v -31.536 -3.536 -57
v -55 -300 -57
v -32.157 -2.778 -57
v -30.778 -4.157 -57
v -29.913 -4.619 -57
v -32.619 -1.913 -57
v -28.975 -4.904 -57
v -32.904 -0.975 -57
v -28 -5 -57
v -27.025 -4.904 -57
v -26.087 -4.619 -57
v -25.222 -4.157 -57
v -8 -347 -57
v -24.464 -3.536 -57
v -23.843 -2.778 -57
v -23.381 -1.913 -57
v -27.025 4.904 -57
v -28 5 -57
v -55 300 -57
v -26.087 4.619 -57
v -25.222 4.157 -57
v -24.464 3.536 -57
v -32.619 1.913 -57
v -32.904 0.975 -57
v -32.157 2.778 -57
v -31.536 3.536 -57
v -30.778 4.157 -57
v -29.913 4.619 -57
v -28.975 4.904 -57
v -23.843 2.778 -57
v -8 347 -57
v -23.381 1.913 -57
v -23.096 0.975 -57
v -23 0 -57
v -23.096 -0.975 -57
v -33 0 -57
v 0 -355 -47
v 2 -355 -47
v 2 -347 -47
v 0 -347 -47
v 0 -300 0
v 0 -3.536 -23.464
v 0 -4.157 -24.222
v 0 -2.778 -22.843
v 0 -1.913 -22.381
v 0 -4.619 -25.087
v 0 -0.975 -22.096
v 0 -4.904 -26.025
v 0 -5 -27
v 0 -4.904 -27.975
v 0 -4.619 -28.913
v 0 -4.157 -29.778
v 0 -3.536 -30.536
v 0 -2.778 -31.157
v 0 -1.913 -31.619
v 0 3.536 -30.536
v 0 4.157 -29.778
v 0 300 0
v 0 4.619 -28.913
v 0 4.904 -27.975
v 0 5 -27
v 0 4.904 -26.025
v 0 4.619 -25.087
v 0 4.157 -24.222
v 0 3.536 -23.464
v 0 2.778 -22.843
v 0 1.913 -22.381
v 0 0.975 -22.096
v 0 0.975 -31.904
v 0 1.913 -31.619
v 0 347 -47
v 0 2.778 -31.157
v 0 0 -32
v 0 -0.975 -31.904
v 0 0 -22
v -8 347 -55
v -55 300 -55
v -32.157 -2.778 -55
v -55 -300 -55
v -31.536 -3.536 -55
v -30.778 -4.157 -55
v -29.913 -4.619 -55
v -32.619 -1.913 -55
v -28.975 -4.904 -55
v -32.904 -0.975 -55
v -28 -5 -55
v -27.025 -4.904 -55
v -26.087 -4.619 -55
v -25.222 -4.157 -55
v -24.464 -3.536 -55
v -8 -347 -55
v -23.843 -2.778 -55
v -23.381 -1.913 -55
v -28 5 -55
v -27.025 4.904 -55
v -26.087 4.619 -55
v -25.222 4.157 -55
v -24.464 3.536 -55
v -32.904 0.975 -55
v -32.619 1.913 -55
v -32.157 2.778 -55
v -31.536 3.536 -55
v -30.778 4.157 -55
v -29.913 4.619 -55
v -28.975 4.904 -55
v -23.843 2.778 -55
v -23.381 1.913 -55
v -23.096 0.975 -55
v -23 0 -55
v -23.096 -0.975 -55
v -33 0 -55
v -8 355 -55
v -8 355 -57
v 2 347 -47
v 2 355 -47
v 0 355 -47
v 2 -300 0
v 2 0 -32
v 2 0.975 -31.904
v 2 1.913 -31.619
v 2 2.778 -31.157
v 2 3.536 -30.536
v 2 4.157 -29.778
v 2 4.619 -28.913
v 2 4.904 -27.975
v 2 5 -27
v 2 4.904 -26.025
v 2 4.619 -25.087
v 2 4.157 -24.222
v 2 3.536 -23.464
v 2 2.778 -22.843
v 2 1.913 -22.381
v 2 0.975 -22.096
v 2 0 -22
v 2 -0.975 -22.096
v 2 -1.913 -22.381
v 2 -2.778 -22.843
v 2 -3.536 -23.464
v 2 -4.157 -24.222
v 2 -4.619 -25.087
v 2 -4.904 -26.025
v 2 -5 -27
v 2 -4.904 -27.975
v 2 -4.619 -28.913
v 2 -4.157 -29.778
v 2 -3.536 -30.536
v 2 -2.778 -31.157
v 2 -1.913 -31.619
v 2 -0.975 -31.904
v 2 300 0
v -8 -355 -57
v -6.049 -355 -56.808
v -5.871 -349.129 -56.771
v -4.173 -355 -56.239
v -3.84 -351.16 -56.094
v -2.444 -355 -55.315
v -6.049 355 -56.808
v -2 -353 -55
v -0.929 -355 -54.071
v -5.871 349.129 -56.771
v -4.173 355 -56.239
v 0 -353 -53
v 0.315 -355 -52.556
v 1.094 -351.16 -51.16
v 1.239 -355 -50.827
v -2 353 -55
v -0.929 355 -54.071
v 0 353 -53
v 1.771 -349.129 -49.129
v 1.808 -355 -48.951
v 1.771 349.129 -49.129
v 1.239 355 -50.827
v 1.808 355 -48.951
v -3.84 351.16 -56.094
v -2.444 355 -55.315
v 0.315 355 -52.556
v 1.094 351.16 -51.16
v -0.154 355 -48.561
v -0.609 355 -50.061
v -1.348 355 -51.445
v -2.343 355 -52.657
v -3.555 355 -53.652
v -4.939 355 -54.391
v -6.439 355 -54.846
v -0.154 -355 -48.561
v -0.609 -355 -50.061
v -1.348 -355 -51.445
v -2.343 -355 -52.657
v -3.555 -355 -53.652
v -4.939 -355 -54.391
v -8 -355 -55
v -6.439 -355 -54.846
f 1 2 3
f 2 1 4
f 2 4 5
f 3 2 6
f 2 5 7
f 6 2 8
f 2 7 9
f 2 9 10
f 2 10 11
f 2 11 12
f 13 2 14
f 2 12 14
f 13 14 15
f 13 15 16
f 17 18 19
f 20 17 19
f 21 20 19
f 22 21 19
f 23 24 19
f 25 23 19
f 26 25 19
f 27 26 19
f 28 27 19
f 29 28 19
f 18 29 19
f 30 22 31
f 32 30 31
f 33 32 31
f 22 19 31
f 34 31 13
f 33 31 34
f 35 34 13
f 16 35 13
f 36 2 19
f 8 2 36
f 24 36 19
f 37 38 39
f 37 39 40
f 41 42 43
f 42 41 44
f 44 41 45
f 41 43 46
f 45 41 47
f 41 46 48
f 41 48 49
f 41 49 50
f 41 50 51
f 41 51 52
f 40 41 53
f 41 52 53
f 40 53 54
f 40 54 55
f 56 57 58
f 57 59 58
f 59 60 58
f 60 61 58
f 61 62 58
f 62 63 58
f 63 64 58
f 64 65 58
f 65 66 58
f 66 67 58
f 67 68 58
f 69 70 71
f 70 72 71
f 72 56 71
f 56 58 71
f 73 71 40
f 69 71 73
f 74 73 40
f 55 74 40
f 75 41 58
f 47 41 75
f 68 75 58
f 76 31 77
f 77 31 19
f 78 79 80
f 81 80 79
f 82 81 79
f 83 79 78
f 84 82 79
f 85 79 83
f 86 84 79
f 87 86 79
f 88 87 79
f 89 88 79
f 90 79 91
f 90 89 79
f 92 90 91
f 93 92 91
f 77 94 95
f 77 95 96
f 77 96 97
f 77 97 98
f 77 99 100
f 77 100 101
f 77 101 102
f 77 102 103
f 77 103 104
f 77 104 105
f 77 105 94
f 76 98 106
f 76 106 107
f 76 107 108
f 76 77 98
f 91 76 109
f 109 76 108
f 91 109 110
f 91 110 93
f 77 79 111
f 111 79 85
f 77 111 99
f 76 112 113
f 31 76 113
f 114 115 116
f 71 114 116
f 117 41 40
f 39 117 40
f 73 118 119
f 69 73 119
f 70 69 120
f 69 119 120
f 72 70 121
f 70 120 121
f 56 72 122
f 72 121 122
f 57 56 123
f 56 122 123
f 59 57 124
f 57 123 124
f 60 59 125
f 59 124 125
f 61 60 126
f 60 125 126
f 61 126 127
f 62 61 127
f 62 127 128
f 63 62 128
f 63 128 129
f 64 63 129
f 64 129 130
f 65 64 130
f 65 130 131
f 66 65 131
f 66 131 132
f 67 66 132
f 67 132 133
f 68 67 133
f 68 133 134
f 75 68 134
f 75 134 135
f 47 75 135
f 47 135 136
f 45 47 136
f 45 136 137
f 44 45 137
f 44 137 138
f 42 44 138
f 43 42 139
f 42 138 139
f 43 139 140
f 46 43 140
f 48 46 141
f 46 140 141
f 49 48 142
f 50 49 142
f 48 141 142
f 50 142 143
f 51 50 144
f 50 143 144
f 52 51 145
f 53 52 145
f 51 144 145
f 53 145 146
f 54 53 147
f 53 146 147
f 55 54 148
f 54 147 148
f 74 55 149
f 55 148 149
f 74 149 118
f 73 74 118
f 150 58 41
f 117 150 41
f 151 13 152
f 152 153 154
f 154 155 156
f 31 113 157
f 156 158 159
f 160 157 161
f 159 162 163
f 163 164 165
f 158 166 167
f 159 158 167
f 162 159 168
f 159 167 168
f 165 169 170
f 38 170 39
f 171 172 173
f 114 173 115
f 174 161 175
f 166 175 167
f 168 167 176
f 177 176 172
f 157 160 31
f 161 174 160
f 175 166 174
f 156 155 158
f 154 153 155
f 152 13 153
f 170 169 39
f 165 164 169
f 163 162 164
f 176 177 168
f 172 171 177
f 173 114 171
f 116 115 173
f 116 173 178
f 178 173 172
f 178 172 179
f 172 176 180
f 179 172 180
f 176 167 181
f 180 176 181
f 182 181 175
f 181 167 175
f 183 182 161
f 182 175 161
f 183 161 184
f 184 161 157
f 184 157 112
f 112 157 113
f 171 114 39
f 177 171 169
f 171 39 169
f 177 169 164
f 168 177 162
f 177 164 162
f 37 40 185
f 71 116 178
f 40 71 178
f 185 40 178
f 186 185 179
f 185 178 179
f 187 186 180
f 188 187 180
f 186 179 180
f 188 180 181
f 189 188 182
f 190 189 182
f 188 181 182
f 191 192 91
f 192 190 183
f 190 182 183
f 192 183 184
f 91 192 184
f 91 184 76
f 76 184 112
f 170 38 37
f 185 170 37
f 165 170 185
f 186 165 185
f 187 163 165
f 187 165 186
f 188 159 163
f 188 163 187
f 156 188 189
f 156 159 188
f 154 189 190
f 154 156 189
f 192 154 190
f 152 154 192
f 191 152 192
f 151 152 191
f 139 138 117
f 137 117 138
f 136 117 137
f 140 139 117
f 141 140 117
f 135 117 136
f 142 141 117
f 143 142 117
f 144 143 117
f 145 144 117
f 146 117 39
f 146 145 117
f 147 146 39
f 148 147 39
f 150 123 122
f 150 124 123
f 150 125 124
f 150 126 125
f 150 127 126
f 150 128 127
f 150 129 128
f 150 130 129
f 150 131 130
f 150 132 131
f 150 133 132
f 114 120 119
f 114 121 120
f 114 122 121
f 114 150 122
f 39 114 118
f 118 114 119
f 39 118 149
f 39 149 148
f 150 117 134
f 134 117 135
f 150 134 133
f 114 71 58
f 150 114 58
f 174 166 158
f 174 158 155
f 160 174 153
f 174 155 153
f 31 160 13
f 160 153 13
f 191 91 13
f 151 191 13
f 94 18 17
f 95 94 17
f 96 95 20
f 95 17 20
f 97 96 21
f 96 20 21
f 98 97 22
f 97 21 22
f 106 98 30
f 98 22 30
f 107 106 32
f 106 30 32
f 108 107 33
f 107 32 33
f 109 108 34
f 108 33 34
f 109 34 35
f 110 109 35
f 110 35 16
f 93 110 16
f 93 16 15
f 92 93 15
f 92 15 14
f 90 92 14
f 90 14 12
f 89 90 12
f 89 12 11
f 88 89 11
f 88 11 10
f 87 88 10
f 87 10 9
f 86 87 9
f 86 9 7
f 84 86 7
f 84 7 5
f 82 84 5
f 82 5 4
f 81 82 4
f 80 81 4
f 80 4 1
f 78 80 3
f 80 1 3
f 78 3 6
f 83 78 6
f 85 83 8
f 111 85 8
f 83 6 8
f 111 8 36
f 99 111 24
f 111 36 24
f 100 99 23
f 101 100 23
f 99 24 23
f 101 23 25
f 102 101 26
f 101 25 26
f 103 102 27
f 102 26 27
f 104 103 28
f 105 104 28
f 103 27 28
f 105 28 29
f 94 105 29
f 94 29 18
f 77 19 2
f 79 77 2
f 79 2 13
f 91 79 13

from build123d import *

# Parameters (mm, degrees)
BOSS_EXTRUDE1_DEPTH            = 2
BOSS_EXTRUDE3_DEPTH            = 2
CUT_EXTRUDE2_REACH             = 365.729
CUT_EXTRUDE2_DIRECTION_2_REACH = 365.729
BOSS_EXTRUDE5_DEPTH            = 355
BOSS_EXTRUDE5_DEPTH_BACK       = 355
SKETCH7_R                      = 5
CUT_EXTRUDE3_DEPTH             = 355
SKETCH8_R                      = 5
CUT_EXTRUDE4_DEPTH             = 355


with BuildPart() as part:
    # Sketch1 → Boss-Extrude1 (new body)
    with BuildSketch(Plane(origin=(0, 0, 0), x_dir=(0, 0, -1), z_dir=(1, 0, 0))):
        Polygon((0, -300), (55, -355), (57, -355), (57, 355), (55, 355), (0, 300), align=None)
    extrude(amount=BOSS_EXTRUDE1_DEPTH)

    # Sketch2 → Boss-Extrude3 (add)
    with BuildSketch(Plane(origin=(0, 0, -57), x_dir=(-1, 0, 0), z_dir=(0, 0, -1))):
        Polygon((55, 300), (55, -300), (0, -355), (0, 355), align=None)
    extrude(amount=-BOSS_EXTRUDE3_DEPTH)

    # Sketch3 → Cut-Extrude2 (cut, up to next)
    with BuildSketch(Plane(origin=(0, 0, 0), x_dir=(-1, 0, 0), z_dir=(0, -1, 0)), mode=Mode.PRIVATE) as cut_extrude2_sk1:
        with BuildLine():
            Line((8, 57), (-2, 57))
            Line((-2, 57), (-2, 47))
            ThreePointArc((-2, 47), (0.928932188, 54.071067812), (8, 57))
        make_face()
    cut_extrude2_tool1 = extrude(cut_extrude2_sk1.sketch, amount=-CUT_EXTRUDE2_REACH, mode=Mode.PRIVATE) & part.part
    add(cut_extrude2_tool1.solids().sort_by_distance((-0.233679, 0, -54.766321))[0], mode=Mode.SUBTRACT)

    # Sketch3 → Cut-Extrude2 direction 2 (cut, up to next)
    with BuildSketch(Plane(origin=(0, 0, 0), x_dir=(-1, 0, 0), z_dir=(0, -1, 0)), mode=Mode.PRIVATE) as cut_extrude2_direction_2_sk1:
        with BuildLine():
            Line((8, 57), (-2, 57))
            Line((-2, 57), (-2, 47))
            ThreePointArc((-2, 47), (0.928932188, 54.071067812), (8, 57))
        make_face()
    cut_extrude2_direction_2_tool1 = extrude(cut_extrude2_direction_2_sk1.sketch, amount=CUT_EXTRUDE2_DIRECTION_2_REACH, mode=Mode.PRIVATE) & part.part
    add(cut_extrude2_direction_2_tool1.solids().sort_by_distance((-0.233679, 0, -54.766321))[0], mode=Mode.SUBTRACT)


with BuildPart() as cut_extrude2_piece_1:
    # of the separate pieces the step leaves, piece 1, a body of its own (cut_extrude2_pieces)
    add(part.part.solids().sort_by_distance((-8, -347, -57))[0])



with BuildPart() as cut_extrude2_piece_2:
    # of the separate pieces the step leaves, piece 2, a body of its own (cut_extrude2_pieces)
    add(part.part.solids().sort_by_distance((0, 300, 0))[0])


with BuildPart() as cut_extrude2_piece_1_1:
    add(cut_extrude2_piece_1.part)

    add(cut_extrude2_piece_2.part)  # Boss-Extrude5 merges Cut-Extrude2 piece 2
    # Sketch6 → Boss-Extrude5 (add, two sides: drawn at the far end of the back side and taken through both)
    with BuildSketch(Plane(origin=(0, 0, 0), x_dir=(-1, 0, 0), z_dir=(0, -1, 0)).offset(-BOSS_EXTRUDE5_DEPTH_BACK)):
        with BuildLine():
            Line((8, 55), (8, 57))
            ThreePointArc((8, 57), (0.928932188, 54.071067812), (-2, 47))
            Line((-2, 47), (0, 47))
            ThreePointArc((0, 47), (2.343145751, 52.656854249), (8, 55))
        make_face()
    extrude(amount=BOSS_EXTRUDE5_DEPTH + BOSS_EXTRUDE5_DEPTH_BACK)

    # Sketch7 → Cut-Extrude3 (cut)
    with BuildSketch(Plane(origin=(0, 0, -57), x_dir=(-1, 0, 0), z_dir=(0, 0, -1))):
        with Locations((28, 0)):
            Circle(SKETCH7_R)
    extrude(amount=-CUT_EXTRUDE3_DEPTH, mode=Mode.SUBTRACT)

    # Sketch8 → Cut-Extrude4 (cut)
    with BuildSketch(Plane(origin=(2, 0, 0), x_dir=(0, 0, -1), z_dir=(1, 0, 0))):
        with Locations((27, 0)):
            Circle(SKETCH8_R)
    extrude(amount=-CUT_EXTRUDE4_DEPTH, mode=Mode.SUBTRACT)


solid = cut_extrude2_piece_1_1.part
